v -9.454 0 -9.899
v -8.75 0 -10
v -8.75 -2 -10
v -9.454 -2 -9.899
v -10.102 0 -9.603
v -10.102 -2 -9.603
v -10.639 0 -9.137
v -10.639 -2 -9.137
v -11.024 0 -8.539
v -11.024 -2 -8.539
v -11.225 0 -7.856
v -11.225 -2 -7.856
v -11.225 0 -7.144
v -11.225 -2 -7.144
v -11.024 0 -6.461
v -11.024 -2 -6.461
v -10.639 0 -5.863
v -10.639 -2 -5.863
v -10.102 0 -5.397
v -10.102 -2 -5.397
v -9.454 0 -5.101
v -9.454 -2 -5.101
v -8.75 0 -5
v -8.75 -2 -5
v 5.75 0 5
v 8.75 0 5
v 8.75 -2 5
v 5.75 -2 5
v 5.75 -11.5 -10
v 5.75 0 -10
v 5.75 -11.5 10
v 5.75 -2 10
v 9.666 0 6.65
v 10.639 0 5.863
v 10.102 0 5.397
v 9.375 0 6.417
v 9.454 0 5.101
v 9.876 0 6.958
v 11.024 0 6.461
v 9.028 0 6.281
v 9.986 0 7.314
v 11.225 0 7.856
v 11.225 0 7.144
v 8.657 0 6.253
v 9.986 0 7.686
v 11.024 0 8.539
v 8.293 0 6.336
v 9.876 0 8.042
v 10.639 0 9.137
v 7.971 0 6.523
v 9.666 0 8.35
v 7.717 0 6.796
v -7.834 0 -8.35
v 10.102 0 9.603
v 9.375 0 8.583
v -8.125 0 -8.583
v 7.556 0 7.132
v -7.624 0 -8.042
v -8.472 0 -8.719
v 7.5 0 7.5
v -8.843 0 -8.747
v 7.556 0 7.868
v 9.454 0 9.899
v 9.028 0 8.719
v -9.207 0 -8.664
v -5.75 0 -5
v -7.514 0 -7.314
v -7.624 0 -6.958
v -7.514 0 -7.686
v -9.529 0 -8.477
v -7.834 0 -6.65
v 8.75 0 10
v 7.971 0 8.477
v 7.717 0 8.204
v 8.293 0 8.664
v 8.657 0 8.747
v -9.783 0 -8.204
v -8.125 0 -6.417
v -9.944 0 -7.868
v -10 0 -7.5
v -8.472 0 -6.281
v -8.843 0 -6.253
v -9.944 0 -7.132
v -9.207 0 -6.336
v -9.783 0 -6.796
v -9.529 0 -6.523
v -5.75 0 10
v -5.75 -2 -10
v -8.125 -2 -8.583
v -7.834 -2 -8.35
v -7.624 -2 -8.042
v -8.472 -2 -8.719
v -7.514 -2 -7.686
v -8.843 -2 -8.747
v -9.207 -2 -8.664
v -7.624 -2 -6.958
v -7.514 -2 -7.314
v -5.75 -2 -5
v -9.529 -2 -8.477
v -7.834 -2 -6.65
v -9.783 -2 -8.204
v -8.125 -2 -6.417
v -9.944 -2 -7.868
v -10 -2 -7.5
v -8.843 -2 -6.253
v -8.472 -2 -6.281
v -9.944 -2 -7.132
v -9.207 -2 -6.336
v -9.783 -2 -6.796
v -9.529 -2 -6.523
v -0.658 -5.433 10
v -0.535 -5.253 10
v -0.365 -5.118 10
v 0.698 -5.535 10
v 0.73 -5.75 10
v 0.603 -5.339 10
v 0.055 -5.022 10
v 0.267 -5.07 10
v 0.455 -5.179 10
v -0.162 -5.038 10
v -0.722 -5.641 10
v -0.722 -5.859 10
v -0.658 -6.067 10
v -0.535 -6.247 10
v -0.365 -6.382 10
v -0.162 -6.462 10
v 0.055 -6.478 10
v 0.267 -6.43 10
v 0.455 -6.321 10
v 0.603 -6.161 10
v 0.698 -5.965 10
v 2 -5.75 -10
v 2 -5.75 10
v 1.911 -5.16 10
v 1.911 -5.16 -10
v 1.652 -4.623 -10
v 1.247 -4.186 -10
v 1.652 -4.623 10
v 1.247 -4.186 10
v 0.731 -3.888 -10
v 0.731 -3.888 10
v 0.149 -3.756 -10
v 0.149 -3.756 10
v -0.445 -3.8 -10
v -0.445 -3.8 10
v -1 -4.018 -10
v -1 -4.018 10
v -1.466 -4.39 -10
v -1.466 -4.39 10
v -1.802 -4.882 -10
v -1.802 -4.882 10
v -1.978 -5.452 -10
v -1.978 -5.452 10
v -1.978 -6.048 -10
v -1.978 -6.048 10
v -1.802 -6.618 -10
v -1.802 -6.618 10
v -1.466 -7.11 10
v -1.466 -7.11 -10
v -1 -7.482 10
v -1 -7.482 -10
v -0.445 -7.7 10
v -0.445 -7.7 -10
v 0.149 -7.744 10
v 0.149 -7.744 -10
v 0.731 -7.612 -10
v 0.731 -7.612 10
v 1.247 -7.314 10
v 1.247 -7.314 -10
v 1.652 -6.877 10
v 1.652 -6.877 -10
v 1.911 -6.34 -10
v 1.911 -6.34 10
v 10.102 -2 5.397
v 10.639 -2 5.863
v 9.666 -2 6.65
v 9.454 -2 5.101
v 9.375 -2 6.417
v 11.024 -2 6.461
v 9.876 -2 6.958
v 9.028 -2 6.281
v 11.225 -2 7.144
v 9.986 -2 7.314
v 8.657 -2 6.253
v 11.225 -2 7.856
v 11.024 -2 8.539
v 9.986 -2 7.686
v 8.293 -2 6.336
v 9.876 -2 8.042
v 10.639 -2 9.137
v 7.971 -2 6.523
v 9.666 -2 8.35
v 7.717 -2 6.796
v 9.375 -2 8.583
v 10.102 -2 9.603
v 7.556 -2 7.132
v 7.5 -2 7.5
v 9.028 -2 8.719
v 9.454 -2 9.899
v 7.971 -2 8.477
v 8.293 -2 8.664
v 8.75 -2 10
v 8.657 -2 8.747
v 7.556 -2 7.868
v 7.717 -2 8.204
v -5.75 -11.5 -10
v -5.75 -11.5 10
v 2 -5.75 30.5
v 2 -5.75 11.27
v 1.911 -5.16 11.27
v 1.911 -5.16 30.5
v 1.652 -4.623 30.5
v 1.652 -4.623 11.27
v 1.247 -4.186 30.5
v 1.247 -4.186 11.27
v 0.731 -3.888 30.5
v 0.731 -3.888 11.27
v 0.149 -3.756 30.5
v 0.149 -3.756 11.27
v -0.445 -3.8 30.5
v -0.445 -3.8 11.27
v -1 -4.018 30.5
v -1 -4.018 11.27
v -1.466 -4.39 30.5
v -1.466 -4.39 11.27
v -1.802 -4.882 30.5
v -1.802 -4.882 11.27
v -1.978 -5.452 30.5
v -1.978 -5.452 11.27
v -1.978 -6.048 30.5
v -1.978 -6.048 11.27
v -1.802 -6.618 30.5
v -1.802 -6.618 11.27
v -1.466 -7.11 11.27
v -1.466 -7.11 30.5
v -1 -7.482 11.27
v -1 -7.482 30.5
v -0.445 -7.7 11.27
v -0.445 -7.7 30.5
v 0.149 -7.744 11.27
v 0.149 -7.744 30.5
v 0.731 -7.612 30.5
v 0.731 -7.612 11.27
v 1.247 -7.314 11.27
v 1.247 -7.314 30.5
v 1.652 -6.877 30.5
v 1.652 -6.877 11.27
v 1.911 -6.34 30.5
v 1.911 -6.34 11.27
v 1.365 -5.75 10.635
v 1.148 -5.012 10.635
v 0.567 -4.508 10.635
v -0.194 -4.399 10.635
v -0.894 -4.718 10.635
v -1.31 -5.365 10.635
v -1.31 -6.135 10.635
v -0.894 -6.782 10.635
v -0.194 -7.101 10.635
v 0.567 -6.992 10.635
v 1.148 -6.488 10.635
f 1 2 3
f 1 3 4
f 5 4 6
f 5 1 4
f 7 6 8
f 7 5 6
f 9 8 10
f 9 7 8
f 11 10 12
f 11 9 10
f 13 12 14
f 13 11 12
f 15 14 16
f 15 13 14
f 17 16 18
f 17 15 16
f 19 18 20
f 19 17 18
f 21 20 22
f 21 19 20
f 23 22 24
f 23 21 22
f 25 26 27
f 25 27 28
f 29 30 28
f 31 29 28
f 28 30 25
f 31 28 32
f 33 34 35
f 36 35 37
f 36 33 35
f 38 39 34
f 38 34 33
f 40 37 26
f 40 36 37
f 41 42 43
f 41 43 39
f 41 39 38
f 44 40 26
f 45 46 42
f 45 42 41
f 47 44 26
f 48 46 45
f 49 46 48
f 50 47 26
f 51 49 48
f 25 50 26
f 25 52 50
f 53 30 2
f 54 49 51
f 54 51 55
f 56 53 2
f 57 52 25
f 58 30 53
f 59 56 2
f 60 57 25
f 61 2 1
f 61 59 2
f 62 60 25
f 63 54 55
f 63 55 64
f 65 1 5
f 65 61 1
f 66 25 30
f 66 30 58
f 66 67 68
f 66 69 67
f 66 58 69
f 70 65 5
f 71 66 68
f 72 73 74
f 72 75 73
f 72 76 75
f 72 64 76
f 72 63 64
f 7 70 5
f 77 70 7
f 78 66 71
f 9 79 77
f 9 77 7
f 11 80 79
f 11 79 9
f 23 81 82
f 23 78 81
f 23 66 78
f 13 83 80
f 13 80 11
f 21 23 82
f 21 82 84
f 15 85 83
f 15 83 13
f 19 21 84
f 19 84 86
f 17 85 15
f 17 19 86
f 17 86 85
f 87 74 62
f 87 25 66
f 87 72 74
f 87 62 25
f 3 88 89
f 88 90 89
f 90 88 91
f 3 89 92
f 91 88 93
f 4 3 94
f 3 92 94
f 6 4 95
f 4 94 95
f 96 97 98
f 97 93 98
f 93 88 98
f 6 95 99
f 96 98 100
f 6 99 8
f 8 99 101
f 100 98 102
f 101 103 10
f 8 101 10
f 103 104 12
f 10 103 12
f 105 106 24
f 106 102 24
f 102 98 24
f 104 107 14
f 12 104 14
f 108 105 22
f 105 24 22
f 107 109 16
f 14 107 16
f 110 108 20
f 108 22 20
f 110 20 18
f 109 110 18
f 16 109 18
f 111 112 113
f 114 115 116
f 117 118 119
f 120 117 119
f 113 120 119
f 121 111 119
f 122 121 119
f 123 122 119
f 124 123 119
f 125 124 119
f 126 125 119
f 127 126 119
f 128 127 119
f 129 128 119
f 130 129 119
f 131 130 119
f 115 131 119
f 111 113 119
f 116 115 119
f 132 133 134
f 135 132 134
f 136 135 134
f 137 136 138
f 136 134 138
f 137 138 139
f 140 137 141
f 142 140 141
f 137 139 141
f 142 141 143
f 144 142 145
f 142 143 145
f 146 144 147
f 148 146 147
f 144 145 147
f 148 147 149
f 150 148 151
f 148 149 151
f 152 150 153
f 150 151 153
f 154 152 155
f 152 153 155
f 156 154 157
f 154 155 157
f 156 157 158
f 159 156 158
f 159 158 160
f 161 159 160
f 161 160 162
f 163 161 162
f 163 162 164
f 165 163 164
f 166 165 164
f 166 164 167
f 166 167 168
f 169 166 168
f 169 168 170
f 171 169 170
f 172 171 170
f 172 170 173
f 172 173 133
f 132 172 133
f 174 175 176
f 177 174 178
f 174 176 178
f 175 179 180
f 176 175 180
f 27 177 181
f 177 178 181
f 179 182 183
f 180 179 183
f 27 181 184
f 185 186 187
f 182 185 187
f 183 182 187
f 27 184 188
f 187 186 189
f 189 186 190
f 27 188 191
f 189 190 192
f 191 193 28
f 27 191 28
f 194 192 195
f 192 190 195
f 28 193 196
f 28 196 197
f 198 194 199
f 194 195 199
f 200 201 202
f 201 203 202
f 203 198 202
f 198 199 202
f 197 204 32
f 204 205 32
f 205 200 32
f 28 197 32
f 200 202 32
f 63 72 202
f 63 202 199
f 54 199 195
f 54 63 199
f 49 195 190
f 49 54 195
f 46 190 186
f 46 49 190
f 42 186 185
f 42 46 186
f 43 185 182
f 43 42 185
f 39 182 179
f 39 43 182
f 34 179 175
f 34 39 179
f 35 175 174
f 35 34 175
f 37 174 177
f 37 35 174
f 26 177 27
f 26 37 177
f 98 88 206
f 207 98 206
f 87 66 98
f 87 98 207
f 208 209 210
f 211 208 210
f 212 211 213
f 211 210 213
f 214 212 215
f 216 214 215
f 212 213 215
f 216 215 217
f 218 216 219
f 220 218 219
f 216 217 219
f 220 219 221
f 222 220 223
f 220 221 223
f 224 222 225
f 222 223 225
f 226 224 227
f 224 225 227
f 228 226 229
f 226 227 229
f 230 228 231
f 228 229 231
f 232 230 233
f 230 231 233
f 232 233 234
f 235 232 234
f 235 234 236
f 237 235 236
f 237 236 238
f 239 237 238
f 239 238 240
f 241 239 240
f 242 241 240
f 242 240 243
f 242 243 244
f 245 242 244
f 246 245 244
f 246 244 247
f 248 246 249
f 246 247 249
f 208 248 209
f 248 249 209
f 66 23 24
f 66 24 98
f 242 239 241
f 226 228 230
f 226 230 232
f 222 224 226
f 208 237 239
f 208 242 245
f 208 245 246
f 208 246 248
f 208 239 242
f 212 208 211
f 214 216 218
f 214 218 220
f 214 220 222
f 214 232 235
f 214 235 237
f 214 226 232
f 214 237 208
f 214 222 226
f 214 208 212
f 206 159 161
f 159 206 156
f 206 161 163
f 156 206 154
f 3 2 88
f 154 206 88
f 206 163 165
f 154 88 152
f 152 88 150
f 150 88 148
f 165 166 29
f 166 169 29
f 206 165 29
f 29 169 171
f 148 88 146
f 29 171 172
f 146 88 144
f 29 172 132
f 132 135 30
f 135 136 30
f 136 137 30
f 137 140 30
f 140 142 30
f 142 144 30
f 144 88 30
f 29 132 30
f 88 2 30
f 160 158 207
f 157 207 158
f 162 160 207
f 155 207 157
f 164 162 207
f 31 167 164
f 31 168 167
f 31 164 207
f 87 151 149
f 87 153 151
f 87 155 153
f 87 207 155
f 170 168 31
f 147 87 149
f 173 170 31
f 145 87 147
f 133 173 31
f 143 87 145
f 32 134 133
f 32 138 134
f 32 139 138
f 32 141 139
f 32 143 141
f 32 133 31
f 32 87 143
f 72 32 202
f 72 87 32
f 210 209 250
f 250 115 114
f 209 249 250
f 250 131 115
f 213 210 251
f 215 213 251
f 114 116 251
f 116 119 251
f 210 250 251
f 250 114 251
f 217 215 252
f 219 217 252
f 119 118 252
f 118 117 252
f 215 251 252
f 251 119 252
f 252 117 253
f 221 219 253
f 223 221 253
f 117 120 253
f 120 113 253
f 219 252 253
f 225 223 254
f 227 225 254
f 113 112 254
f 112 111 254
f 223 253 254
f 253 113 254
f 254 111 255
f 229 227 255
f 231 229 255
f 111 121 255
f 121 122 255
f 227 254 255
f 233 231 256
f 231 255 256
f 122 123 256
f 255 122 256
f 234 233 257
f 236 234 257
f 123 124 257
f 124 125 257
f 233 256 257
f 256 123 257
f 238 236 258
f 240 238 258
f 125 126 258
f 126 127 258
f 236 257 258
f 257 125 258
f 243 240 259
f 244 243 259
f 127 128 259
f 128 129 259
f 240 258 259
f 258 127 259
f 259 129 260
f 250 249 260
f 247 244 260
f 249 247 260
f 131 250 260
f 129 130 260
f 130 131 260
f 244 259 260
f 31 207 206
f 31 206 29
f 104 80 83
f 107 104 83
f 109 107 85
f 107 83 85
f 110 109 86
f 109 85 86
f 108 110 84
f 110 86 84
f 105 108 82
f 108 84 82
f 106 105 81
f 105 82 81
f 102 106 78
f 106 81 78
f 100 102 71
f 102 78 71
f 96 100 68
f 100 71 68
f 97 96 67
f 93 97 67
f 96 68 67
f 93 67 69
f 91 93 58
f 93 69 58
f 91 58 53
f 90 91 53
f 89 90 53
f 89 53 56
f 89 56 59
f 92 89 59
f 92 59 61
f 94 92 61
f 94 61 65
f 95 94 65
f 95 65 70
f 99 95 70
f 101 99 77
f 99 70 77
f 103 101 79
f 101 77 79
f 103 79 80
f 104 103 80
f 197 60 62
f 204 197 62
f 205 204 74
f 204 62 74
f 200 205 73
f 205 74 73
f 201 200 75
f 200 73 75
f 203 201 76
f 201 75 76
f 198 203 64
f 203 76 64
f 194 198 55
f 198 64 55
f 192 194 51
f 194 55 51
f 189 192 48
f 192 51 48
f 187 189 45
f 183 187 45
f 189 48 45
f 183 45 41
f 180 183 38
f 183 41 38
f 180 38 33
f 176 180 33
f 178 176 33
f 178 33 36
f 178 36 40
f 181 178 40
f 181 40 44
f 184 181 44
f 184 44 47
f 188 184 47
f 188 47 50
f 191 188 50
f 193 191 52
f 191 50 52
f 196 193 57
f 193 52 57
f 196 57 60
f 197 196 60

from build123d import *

# Parameters (mm, degrees)
F0_W     = 11.5
F0_H     = 20
F1_DEPTH = 11.5
F2_R     = 1.25
F3_DEPTH = 2
F4_R     = 2
F5_DEPTH = 20.001
F6_DEPTH = 20.5
F7_SIZE2 = 1.27
F7_SIZE  = 1.27


with BuildPart() as f1:
    # F0 (on Front) → F1 (new body)
    with BuildSketch(Plane.XZ):
        Rectangle(F0_W, F0_H)
    extrude(amount=F1_DEPTH)

    # F2 (on face) → F3 (join)
    with BuildSketch(Plane(origin=(0, 0, 0), x_dir=(-1, 0, 0), z_dir=(0, 1, 0))):
        with BuildLine():
            Line((-5.75, 5), (-5.75, 10))
            Line((-5.75, 10), (-8.75, 10))
            ThreePointArc((-8.75, 10), (-11.25, 7.5), (-8.75, 5))
            Line((-8.75, 5), (-5.75, 5))
        make_face()
        with Locations((-8.75, 7.5)):
            Circle(F2_R, mode=Mode.SUBTRACT)
        with BuildLine():
            Line((8.75, -5), (5.75, -5))
            Line((5.75, -5), (5.75, -10))
            Line((5.75, -10), (8.75, -10))
            ThreePointArc((8.75, -10), (11.25, -7.5), (8.75, -5))
        make_face()
        with Locations((8.75, -7.5)):
            Circle(F2_R, mode=Mode.SUBTRACT)
    extrude(amount=-F3_DEPTH)

    # F4 (on face) → F5 (cut, through all)
    with BuildSketch(Plane.XY.offset(10)):
        with Locations((0, -5.75)):
            Circle(F4_R)
    extrude(amount=-F5_DEPTH, mode=Mode.SUBTRACT)


with BuildPart() as f6:
    # F4 (on face) → F6 (new body)
    with BuildSketch(Plane.XY.offset(10)):
        with Locations((0, -5.75)):
            Circle(F4_R)
    extrude(amount=F6_DEPTH)

    # F7
    f7_edges = [f6.edges().sort_by_distance(p)[0] for p in [
        (-2, -5.75, 10),
    ]]
    chamfer(f7_edges, length=F7_SIZE, length2=F7_SIZE2)


solid = Compound([f1.part, f6.part])
